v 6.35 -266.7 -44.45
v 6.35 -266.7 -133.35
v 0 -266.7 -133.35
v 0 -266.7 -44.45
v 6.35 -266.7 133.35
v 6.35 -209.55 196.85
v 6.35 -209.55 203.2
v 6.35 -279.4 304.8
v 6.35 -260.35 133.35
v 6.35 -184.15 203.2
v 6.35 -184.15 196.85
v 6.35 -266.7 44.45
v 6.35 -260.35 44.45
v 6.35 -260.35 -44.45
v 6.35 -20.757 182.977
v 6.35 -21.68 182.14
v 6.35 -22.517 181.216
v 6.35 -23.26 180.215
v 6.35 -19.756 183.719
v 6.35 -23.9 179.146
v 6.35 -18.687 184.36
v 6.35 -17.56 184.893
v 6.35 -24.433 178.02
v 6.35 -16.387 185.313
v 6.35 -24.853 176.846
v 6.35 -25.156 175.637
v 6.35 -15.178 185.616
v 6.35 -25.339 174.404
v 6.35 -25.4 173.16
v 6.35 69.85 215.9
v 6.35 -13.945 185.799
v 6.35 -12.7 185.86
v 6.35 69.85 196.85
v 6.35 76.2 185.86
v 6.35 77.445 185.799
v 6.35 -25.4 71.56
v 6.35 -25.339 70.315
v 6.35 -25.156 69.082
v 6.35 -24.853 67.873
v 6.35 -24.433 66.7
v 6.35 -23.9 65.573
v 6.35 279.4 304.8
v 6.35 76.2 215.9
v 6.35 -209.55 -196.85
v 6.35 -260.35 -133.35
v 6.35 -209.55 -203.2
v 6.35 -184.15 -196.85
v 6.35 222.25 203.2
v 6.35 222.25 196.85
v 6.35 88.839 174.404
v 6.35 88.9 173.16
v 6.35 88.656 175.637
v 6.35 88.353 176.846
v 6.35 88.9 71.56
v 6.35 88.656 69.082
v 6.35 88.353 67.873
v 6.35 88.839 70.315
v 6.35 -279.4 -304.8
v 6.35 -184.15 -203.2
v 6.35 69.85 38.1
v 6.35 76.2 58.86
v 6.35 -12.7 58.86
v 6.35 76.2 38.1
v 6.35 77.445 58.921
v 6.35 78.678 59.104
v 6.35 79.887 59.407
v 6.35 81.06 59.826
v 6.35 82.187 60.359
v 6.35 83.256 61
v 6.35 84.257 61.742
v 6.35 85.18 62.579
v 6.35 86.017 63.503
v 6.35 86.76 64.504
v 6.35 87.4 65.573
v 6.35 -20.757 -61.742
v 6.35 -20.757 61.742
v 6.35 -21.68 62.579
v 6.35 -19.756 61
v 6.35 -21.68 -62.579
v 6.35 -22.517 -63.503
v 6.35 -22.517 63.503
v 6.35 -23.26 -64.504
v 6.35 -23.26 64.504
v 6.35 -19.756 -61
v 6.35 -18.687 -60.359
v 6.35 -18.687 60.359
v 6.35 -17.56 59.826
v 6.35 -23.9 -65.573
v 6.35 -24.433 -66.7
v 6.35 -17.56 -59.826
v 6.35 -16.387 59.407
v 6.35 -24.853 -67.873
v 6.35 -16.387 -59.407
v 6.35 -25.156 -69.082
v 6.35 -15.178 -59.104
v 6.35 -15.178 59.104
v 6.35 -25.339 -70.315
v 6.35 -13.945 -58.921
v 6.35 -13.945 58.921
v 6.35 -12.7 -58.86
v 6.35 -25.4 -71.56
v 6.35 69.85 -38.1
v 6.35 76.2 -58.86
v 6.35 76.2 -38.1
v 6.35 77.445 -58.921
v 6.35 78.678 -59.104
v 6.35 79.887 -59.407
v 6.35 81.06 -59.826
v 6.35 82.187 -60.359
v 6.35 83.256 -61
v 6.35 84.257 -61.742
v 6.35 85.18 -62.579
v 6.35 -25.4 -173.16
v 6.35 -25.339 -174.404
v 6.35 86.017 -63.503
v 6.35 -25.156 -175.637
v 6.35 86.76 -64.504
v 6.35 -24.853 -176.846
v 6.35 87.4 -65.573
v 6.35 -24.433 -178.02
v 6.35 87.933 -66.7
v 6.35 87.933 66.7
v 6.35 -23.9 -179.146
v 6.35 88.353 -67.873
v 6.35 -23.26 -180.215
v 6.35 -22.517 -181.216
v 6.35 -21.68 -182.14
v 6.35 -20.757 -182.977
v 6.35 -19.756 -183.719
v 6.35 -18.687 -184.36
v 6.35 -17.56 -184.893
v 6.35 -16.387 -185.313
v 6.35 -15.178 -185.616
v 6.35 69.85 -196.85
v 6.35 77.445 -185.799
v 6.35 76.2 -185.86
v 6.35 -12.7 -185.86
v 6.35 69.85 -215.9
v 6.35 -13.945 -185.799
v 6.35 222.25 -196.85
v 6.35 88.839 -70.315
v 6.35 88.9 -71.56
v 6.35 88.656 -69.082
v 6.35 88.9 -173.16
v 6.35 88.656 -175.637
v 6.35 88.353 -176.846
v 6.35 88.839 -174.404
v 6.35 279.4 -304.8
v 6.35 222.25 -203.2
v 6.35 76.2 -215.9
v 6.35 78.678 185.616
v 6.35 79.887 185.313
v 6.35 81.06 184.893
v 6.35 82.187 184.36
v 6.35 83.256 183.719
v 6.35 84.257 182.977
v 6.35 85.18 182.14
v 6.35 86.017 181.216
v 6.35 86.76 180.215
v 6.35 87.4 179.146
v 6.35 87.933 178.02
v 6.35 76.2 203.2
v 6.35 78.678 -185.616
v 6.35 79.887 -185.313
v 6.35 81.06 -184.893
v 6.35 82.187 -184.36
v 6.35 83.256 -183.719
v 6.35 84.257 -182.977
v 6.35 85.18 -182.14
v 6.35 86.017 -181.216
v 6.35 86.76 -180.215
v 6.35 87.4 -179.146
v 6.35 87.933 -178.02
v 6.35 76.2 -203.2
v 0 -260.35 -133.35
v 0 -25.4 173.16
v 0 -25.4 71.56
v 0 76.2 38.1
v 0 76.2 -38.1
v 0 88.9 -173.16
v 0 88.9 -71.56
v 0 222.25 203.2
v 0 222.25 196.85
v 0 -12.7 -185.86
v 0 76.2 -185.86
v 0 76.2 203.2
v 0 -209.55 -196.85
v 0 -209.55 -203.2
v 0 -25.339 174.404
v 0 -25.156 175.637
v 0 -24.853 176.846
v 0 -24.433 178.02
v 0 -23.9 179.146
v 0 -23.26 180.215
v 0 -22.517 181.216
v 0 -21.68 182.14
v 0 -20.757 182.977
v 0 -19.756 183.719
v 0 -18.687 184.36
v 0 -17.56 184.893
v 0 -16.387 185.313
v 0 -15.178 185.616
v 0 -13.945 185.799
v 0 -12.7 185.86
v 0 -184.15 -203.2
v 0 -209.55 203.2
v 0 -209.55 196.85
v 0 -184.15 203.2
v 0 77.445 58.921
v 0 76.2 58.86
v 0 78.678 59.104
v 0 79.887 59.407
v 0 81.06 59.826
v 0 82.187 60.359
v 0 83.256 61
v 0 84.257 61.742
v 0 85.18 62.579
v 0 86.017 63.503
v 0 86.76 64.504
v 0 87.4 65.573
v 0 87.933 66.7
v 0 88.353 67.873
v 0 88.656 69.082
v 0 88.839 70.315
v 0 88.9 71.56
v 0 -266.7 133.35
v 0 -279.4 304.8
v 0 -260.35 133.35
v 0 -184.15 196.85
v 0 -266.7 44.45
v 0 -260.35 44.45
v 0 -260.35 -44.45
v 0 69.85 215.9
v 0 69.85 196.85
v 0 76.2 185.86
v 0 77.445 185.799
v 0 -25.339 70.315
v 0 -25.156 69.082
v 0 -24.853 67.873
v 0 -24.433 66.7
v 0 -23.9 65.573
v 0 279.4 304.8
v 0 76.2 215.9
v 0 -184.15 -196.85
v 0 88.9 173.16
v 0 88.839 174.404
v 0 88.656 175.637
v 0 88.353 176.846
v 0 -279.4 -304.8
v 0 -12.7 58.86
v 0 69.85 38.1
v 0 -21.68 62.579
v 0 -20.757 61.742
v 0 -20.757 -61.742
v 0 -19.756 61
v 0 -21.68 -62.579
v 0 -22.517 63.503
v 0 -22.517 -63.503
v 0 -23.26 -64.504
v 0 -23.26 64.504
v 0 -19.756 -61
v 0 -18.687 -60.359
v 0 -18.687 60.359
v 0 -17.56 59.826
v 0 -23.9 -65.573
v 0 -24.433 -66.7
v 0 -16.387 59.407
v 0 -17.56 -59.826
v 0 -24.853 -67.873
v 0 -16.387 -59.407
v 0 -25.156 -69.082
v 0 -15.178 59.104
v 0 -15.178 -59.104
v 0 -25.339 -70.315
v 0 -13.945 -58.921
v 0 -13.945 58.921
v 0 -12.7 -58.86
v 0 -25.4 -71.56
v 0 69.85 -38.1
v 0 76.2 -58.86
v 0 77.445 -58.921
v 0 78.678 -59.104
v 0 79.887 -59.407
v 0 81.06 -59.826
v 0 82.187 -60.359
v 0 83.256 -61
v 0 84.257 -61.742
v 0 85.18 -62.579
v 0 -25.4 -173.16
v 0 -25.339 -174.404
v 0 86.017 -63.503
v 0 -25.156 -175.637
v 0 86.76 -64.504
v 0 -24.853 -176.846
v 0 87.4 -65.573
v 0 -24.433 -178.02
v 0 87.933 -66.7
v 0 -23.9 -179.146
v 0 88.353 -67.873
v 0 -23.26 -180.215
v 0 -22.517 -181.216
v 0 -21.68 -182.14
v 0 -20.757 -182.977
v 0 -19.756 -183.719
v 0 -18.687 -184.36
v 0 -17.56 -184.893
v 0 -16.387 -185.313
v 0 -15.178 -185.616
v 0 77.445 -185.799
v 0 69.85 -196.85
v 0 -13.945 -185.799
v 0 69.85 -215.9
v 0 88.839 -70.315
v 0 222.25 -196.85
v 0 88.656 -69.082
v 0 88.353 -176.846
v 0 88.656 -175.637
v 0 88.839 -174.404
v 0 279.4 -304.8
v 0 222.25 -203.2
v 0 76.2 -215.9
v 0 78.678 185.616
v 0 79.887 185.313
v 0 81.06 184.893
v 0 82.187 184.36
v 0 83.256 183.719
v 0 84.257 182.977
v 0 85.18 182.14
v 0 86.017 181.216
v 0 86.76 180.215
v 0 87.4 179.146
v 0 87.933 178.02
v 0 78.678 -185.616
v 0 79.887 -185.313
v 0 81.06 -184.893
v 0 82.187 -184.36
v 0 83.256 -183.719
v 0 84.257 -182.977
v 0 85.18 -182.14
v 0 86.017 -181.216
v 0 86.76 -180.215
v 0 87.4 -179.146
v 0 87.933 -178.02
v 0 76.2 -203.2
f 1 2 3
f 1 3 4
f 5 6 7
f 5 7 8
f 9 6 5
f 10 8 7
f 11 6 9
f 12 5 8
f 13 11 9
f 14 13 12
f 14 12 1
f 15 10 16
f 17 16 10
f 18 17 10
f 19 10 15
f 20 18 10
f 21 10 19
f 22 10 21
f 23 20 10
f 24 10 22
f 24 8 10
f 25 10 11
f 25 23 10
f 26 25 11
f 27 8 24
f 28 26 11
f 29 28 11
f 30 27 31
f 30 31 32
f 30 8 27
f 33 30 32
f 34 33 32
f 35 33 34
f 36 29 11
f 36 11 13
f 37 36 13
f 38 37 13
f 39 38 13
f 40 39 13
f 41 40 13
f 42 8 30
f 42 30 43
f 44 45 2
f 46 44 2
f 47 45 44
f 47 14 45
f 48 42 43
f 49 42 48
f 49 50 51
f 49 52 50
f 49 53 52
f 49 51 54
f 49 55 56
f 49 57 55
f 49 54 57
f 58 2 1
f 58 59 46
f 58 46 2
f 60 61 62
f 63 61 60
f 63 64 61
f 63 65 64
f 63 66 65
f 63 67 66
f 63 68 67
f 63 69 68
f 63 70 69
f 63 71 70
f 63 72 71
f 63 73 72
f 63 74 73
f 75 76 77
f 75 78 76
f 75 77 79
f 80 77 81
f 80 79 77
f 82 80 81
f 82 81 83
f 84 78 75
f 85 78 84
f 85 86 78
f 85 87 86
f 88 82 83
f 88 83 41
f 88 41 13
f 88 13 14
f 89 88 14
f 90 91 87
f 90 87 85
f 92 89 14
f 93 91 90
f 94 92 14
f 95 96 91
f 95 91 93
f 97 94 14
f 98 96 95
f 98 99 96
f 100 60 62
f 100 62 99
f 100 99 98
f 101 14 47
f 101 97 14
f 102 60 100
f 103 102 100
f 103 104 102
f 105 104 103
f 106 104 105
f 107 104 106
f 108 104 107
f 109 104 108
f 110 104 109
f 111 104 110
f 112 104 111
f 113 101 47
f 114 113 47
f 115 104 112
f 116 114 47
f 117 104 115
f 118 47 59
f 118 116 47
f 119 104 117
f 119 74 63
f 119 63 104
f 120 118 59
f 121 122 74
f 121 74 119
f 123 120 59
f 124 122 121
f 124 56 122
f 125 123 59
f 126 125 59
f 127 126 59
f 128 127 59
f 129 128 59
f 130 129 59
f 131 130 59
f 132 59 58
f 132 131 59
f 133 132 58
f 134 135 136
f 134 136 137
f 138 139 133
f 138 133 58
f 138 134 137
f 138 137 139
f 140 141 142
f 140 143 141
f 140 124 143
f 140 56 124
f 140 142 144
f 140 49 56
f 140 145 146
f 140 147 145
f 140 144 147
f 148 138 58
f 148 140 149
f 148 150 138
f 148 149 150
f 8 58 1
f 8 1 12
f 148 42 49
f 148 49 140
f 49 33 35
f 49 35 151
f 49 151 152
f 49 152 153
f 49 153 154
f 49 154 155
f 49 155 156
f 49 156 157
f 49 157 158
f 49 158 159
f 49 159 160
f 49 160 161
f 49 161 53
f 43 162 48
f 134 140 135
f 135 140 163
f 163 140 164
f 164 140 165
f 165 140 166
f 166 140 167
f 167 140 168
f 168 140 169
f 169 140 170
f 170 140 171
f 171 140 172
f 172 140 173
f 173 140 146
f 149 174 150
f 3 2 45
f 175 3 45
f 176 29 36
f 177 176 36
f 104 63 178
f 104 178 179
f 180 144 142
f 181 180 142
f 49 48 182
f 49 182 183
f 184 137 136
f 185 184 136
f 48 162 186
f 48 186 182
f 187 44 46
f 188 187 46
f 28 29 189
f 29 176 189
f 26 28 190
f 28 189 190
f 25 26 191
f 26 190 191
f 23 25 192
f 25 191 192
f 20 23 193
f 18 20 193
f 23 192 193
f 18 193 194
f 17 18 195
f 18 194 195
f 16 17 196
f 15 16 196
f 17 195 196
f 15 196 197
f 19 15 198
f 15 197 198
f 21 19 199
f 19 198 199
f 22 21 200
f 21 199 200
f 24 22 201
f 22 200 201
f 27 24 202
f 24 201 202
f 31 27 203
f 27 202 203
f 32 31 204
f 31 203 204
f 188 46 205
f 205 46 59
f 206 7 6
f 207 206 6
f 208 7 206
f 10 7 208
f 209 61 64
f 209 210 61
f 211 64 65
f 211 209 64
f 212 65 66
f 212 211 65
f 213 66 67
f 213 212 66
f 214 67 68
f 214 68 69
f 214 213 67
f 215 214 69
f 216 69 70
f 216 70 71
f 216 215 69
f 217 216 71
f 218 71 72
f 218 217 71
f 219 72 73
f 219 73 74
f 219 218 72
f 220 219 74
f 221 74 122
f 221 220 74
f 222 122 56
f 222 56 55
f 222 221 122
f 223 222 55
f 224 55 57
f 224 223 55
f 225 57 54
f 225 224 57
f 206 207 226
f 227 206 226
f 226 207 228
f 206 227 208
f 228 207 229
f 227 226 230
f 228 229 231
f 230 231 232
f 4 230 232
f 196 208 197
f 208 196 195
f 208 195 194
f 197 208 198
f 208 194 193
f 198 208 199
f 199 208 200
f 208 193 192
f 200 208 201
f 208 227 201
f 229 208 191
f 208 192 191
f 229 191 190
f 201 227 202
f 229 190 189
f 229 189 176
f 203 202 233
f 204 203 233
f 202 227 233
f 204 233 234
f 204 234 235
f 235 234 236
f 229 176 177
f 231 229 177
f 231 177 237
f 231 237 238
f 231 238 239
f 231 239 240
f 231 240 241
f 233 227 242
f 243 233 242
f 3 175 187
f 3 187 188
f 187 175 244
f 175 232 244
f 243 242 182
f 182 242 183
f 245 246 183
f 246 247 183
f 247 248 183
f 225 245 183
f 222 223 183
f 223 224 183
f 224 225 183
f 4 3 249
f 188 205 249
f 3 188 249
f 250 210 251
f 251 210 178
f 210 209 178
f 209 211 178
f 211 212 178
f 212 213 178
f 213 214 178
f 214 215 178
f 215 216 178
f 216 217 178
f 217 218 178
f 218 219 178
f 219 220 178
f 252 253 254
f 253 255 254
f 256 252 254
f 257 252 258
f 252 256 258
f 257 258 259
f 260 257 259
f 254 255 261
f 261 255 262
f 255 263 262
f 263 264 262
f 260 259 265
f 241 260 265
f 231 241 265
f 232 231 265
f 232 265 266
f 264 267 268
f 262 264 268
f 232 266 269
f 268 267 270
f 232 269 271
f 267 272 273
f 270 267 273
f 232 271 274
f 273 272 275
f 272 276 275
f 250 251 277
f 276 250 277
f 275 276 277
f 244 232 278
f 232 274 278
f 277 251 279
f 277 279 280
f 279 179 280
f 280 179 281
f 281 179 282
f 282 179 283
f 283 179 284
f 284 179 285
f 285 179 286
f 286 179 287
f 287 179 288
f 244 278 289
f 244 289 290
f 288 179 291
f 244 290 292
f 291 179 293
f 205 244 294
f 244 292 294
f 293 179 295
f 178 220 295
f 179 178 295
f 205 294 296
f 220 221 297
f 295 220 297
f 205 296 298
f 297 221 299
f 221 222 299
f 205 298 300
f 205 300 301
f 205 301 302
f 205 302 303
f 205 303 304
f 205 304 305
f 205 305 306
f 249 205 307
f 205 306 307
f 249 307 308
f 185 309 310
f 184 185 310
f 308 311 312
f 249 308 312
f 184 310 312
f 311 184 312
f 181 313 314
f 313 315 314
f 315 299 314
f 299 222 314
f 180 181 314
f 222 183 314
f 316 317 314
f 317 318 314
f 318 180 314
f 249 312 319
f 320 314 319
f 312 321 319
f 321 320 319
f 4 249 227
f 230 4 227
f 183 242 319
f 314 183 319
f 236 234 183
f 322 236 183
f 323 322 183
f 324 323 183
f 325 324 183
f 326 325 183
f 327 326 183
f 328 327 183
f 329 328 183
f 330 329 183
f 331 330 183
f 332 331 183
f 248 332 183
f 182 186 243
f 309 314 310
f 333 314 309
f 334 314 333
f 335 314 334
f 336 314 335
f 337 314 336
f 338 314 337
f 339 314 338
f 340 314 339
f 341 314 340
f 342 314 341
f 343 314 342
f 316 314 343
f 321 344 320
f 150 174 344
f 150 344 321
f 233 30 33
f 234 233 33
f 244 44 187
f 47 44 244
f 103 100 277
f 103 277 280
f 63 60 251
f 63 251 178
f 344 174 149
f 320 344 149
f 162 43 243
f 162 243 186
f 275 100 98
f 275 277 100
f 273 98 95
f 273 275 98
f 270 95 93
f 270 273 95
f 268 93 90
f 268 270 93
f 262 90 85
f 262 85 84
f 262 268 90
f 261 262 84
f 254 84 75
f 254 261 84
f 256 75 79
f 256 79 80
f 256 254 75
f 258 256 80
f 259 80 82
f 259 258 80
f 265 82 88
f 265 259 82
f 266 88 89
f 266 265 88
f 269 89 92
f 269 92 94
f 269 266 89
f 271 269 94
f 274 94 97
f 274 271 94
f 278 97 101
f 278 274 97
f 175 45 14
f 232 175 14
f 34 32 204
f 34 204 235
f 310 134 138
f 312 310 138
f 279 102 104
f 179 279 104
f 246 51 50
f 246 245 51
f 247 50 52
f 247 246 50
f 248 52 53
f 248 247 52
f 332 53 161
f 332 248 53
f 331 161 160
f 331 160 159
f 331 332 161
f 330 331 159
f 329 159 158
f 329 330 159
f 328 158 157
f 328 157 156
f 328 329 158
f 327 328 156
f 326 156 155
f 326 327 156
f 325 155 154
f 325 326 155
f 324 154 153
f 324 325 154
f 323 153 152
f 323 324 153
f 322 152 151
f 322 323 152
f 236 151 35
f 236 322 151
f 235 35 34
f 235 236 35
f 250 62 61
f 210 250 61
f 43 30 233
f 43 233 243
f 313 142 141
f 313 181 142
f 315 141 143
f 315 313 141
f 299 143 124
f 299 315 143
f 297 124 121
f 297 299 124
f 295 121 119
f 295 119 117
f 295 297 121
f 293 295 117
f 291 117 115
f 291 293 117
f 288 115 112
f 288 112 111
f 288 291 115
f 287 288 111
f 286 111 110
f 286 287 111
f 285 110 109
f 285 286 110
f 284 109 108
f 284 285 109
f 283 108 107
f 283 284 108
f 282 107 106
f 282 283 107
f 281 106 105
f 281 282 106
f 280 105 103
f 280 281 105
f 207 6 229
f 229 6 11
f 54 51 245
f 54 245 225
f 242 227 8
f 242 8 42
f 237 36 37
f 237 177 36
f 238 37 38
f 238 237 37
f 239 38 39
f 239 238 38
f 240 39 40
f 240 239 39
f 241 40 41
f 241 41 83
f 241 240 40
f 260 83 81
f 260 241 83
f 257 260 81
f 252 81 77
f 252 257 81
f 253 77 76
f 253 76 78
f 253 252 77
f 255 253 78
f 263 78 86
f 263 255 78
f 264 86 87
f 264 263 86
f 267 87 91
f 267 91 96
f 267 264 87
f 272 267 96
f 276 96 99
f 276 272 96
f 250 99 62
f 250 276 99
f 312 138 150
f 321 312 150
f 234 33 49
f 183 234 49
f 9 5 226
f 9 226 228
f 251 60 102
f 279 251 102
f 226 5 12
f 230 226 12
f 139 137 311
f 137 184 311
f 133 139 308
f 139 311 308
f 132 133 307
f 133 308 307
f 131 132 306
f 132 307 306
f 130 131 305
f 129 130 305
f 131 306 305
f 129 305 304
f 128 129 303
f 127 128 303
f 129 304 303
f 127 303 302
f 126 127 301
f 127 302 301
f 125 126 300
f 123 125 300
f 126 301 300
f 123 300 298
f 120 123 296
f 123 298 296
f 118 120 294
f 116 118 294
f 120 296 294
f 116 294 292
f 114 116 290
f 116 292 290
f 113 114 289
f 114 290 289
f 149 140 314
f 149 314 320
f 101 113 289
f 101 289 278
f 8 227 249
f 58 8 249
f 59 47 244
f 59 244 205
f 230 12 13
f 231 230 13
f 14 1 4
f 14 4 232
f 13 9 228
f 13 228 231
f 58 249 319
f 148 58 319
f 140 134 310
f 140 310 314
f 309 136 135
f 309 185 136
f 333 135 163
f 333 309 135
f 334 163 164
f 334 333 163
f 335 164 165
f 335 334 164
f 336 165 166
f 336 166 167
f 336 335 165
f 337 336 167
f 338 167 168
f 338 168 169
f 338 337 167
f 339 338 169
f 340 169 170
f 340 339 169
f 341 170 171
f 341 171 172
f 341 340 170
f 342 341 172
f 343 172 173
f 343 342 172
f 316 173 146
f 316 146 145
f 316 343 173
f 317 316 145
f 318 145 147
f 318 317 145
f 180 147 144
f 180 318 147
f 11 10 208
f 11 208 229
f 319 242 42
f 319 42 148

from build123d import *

# Parameters (mm, degrees)
SKETCH1_W            = 609.6
SKETCH1_H            = 558.8
MAIN_BODY_DEPTH      = 6.35
SKETCH2_W            = 6.35
SKETCH2_H            = 152.4
CUT_EXTRUDE1_DEPTH   = 414.530799941
SKETCH8_W            = 127
SKETCH8_H            = 114.3
CUT_EXTRUDE5_DEPTH   = 414.530799941
FILLET3_R            = 12.7
FILLET3_OF_MIRROR3_R = 12.7
SKETCH9_W            = 88.9
SKETCH9_H            = 6.35
CUT_EXTRUDE7_DEPTH   = 414.530799941
SKETCH10_W           = 6.35
SKETCH10_H           = 25.4
CUT_EXTRUDE8_DEPTH   = 414.530799941
SKETCH11_W           = 12.7
SKETCH11_H           = 6.35
CUT_EXTRUDE9_DEPTH   = 414.530799941
SKETCH12_W           = 76.2
SKETCH12_H           = 6.35
CUT_EXTRUDE10_DEPTH  = 414.530799941


with BuildPart() as part:
    # Sketch1 → Main Body (new body)
    with BuildSketch(Plane(origin=(0, 0, 0), x_dir=(0, 0, -1), z_dir=(1, 0, 0))):
        Rectangle(SKETCH1_W, SKETCH1_H)
    extrude(amount=MAIN_BODY_DEPTH)

    # Sketch2 → Cut-Extrude1 (cut, through all)
    with BuildSketch(Plane(origin=(6.35, 0, 0), x_dir=(0, 0, -1), z_dir=(1, 0, 0))):
        with Locations((-200.025, 146.05)):
            Rectangle(SKETCH2_W, SKETCH2_H)
        with Locations((200.025, 146.05)):
            Rectangle(SKETCH2_W, SKETCH2_H)
    extrude(amount=-CUT_EXTRUDE1_DEPTH, mode=Mode.SUBTRACT)

    # Sketch8 → Cut-Extrude5 (cut, through all)
    with BuildSketch(Plane(origin=(6.35, 0, 0), x_dir=(0, 0, -1), z_dir=(1, 0, 0))):
        with Locations((-122.359674, 31.75)):
            Rectangle(SKETCH8_W, SKETCH8_H)
    cut_extrude5 = extrude(amount=-CUT_EXTRUDE5_DEPTH, mode=Mode.SUBTRACT)

    # Fillet3
    fillet3_edges = [part.edges().sort_by_distance(p)[0] for p in [
        (3.175, 88.9, 58.859674),
        (3.175, -25.4, 58.859674),
        (3.175, -25.4, 185.859674),
        (3.175, 88.9, 185.859674),
    ]]
    fillet(fillet3_edges, radius=FILLET3_R)

    # Mirror3: Cut-Extrude5 across plane
    add(cut_extrude5.mirror(Plane.XY), mode=Mode.SUBTRACT)

    # Fillet3 of Mirror3
    fillet3_of_mirror3_edges = [part.edges().sort_by_distance(p)[0] for p in [
        (3.175, 88.9, -58.859674),
        (3.175, -25.4, -58.859674),
        (3.175, -25.4, -185.859674),
        (3.175, 88.9, -185.859674),
    ]]
    fillet(fillet3_of_mirror3_edges, radius=FILLET3_OF_MIRROR3_R)

    # Sketch9 → Cut-Extrude7 (cut, through all)
    with BuildSketch(Plane(origin=(6.35, 0, 0), x_dir=(0, 0, -1), z_dir=(1, 0, 0))):
        with Locations((-88.9, -263.525)):
            Rectangle(SKETCH9_W, SKETCH9_H)
    cut_extrude7 = extrude(amount=-CUT_EXTRUDE7_DEPTH, mode=Mode.SUBTRACT)

    # Mirror4: Cut-Extrude7 across plane
    add(cut_extrude7.mirror(Plane.XY), mode=Mode.SUBTRACT)

    # Sketch10 → Cut-Extrude8 (cut, through all)
    with BuildSketch(Plane(origin=(6.35, 0, 0), x_dir=(0, 0, -1), z_dir=(1, 0, 0))):
        with Locations((-200.025, -196.85)):
            Rectangle(SKETCH10_W, SKETCH10_H)
        with Locations((200.025, -196.85)):
            Rectangle(SKETCH10_W, SKETCH10_H)
    extrude(amount=-CUT_EXTRUDE8_DEPTH, mode=Mode.SUBTRACT)

    # Sketch11 → Cut-Extrude9 (cut, through all)
    with BuildSketch(Plane(origin=(6.35, 0, 0), x_dir=(0, 0, -1), z_dir=(1, 0, 0))):
        with Locations((-209.55, 73.025)):
            Rectangle(SKETCH11_W, SKETCH11_H)
        with Locations((209.55, 73.025)):
            Rectangle(SKETCH11_W, SKETCH11_H)
    extrude(amount=-CUT_EXTRUDE9_DEPTH, mode=Mode.SUBTRACT)

    # Sketch12 → Cut-Extrude10 (cut, through all)
    with BuildSketch(Plane(origin=(6.35, 0, 0), x_dir=(0, 0, -1), z_dir=(1, 0, 0))):
        with Locations((0, 73.025)):
            Rectangle(SKETCH12_W, SKETCH12_H)
    extrude(amount=-CUT_EXTRUDE10_DEPTH, mode=Mode.SUBTRACT)


solid = part.part
